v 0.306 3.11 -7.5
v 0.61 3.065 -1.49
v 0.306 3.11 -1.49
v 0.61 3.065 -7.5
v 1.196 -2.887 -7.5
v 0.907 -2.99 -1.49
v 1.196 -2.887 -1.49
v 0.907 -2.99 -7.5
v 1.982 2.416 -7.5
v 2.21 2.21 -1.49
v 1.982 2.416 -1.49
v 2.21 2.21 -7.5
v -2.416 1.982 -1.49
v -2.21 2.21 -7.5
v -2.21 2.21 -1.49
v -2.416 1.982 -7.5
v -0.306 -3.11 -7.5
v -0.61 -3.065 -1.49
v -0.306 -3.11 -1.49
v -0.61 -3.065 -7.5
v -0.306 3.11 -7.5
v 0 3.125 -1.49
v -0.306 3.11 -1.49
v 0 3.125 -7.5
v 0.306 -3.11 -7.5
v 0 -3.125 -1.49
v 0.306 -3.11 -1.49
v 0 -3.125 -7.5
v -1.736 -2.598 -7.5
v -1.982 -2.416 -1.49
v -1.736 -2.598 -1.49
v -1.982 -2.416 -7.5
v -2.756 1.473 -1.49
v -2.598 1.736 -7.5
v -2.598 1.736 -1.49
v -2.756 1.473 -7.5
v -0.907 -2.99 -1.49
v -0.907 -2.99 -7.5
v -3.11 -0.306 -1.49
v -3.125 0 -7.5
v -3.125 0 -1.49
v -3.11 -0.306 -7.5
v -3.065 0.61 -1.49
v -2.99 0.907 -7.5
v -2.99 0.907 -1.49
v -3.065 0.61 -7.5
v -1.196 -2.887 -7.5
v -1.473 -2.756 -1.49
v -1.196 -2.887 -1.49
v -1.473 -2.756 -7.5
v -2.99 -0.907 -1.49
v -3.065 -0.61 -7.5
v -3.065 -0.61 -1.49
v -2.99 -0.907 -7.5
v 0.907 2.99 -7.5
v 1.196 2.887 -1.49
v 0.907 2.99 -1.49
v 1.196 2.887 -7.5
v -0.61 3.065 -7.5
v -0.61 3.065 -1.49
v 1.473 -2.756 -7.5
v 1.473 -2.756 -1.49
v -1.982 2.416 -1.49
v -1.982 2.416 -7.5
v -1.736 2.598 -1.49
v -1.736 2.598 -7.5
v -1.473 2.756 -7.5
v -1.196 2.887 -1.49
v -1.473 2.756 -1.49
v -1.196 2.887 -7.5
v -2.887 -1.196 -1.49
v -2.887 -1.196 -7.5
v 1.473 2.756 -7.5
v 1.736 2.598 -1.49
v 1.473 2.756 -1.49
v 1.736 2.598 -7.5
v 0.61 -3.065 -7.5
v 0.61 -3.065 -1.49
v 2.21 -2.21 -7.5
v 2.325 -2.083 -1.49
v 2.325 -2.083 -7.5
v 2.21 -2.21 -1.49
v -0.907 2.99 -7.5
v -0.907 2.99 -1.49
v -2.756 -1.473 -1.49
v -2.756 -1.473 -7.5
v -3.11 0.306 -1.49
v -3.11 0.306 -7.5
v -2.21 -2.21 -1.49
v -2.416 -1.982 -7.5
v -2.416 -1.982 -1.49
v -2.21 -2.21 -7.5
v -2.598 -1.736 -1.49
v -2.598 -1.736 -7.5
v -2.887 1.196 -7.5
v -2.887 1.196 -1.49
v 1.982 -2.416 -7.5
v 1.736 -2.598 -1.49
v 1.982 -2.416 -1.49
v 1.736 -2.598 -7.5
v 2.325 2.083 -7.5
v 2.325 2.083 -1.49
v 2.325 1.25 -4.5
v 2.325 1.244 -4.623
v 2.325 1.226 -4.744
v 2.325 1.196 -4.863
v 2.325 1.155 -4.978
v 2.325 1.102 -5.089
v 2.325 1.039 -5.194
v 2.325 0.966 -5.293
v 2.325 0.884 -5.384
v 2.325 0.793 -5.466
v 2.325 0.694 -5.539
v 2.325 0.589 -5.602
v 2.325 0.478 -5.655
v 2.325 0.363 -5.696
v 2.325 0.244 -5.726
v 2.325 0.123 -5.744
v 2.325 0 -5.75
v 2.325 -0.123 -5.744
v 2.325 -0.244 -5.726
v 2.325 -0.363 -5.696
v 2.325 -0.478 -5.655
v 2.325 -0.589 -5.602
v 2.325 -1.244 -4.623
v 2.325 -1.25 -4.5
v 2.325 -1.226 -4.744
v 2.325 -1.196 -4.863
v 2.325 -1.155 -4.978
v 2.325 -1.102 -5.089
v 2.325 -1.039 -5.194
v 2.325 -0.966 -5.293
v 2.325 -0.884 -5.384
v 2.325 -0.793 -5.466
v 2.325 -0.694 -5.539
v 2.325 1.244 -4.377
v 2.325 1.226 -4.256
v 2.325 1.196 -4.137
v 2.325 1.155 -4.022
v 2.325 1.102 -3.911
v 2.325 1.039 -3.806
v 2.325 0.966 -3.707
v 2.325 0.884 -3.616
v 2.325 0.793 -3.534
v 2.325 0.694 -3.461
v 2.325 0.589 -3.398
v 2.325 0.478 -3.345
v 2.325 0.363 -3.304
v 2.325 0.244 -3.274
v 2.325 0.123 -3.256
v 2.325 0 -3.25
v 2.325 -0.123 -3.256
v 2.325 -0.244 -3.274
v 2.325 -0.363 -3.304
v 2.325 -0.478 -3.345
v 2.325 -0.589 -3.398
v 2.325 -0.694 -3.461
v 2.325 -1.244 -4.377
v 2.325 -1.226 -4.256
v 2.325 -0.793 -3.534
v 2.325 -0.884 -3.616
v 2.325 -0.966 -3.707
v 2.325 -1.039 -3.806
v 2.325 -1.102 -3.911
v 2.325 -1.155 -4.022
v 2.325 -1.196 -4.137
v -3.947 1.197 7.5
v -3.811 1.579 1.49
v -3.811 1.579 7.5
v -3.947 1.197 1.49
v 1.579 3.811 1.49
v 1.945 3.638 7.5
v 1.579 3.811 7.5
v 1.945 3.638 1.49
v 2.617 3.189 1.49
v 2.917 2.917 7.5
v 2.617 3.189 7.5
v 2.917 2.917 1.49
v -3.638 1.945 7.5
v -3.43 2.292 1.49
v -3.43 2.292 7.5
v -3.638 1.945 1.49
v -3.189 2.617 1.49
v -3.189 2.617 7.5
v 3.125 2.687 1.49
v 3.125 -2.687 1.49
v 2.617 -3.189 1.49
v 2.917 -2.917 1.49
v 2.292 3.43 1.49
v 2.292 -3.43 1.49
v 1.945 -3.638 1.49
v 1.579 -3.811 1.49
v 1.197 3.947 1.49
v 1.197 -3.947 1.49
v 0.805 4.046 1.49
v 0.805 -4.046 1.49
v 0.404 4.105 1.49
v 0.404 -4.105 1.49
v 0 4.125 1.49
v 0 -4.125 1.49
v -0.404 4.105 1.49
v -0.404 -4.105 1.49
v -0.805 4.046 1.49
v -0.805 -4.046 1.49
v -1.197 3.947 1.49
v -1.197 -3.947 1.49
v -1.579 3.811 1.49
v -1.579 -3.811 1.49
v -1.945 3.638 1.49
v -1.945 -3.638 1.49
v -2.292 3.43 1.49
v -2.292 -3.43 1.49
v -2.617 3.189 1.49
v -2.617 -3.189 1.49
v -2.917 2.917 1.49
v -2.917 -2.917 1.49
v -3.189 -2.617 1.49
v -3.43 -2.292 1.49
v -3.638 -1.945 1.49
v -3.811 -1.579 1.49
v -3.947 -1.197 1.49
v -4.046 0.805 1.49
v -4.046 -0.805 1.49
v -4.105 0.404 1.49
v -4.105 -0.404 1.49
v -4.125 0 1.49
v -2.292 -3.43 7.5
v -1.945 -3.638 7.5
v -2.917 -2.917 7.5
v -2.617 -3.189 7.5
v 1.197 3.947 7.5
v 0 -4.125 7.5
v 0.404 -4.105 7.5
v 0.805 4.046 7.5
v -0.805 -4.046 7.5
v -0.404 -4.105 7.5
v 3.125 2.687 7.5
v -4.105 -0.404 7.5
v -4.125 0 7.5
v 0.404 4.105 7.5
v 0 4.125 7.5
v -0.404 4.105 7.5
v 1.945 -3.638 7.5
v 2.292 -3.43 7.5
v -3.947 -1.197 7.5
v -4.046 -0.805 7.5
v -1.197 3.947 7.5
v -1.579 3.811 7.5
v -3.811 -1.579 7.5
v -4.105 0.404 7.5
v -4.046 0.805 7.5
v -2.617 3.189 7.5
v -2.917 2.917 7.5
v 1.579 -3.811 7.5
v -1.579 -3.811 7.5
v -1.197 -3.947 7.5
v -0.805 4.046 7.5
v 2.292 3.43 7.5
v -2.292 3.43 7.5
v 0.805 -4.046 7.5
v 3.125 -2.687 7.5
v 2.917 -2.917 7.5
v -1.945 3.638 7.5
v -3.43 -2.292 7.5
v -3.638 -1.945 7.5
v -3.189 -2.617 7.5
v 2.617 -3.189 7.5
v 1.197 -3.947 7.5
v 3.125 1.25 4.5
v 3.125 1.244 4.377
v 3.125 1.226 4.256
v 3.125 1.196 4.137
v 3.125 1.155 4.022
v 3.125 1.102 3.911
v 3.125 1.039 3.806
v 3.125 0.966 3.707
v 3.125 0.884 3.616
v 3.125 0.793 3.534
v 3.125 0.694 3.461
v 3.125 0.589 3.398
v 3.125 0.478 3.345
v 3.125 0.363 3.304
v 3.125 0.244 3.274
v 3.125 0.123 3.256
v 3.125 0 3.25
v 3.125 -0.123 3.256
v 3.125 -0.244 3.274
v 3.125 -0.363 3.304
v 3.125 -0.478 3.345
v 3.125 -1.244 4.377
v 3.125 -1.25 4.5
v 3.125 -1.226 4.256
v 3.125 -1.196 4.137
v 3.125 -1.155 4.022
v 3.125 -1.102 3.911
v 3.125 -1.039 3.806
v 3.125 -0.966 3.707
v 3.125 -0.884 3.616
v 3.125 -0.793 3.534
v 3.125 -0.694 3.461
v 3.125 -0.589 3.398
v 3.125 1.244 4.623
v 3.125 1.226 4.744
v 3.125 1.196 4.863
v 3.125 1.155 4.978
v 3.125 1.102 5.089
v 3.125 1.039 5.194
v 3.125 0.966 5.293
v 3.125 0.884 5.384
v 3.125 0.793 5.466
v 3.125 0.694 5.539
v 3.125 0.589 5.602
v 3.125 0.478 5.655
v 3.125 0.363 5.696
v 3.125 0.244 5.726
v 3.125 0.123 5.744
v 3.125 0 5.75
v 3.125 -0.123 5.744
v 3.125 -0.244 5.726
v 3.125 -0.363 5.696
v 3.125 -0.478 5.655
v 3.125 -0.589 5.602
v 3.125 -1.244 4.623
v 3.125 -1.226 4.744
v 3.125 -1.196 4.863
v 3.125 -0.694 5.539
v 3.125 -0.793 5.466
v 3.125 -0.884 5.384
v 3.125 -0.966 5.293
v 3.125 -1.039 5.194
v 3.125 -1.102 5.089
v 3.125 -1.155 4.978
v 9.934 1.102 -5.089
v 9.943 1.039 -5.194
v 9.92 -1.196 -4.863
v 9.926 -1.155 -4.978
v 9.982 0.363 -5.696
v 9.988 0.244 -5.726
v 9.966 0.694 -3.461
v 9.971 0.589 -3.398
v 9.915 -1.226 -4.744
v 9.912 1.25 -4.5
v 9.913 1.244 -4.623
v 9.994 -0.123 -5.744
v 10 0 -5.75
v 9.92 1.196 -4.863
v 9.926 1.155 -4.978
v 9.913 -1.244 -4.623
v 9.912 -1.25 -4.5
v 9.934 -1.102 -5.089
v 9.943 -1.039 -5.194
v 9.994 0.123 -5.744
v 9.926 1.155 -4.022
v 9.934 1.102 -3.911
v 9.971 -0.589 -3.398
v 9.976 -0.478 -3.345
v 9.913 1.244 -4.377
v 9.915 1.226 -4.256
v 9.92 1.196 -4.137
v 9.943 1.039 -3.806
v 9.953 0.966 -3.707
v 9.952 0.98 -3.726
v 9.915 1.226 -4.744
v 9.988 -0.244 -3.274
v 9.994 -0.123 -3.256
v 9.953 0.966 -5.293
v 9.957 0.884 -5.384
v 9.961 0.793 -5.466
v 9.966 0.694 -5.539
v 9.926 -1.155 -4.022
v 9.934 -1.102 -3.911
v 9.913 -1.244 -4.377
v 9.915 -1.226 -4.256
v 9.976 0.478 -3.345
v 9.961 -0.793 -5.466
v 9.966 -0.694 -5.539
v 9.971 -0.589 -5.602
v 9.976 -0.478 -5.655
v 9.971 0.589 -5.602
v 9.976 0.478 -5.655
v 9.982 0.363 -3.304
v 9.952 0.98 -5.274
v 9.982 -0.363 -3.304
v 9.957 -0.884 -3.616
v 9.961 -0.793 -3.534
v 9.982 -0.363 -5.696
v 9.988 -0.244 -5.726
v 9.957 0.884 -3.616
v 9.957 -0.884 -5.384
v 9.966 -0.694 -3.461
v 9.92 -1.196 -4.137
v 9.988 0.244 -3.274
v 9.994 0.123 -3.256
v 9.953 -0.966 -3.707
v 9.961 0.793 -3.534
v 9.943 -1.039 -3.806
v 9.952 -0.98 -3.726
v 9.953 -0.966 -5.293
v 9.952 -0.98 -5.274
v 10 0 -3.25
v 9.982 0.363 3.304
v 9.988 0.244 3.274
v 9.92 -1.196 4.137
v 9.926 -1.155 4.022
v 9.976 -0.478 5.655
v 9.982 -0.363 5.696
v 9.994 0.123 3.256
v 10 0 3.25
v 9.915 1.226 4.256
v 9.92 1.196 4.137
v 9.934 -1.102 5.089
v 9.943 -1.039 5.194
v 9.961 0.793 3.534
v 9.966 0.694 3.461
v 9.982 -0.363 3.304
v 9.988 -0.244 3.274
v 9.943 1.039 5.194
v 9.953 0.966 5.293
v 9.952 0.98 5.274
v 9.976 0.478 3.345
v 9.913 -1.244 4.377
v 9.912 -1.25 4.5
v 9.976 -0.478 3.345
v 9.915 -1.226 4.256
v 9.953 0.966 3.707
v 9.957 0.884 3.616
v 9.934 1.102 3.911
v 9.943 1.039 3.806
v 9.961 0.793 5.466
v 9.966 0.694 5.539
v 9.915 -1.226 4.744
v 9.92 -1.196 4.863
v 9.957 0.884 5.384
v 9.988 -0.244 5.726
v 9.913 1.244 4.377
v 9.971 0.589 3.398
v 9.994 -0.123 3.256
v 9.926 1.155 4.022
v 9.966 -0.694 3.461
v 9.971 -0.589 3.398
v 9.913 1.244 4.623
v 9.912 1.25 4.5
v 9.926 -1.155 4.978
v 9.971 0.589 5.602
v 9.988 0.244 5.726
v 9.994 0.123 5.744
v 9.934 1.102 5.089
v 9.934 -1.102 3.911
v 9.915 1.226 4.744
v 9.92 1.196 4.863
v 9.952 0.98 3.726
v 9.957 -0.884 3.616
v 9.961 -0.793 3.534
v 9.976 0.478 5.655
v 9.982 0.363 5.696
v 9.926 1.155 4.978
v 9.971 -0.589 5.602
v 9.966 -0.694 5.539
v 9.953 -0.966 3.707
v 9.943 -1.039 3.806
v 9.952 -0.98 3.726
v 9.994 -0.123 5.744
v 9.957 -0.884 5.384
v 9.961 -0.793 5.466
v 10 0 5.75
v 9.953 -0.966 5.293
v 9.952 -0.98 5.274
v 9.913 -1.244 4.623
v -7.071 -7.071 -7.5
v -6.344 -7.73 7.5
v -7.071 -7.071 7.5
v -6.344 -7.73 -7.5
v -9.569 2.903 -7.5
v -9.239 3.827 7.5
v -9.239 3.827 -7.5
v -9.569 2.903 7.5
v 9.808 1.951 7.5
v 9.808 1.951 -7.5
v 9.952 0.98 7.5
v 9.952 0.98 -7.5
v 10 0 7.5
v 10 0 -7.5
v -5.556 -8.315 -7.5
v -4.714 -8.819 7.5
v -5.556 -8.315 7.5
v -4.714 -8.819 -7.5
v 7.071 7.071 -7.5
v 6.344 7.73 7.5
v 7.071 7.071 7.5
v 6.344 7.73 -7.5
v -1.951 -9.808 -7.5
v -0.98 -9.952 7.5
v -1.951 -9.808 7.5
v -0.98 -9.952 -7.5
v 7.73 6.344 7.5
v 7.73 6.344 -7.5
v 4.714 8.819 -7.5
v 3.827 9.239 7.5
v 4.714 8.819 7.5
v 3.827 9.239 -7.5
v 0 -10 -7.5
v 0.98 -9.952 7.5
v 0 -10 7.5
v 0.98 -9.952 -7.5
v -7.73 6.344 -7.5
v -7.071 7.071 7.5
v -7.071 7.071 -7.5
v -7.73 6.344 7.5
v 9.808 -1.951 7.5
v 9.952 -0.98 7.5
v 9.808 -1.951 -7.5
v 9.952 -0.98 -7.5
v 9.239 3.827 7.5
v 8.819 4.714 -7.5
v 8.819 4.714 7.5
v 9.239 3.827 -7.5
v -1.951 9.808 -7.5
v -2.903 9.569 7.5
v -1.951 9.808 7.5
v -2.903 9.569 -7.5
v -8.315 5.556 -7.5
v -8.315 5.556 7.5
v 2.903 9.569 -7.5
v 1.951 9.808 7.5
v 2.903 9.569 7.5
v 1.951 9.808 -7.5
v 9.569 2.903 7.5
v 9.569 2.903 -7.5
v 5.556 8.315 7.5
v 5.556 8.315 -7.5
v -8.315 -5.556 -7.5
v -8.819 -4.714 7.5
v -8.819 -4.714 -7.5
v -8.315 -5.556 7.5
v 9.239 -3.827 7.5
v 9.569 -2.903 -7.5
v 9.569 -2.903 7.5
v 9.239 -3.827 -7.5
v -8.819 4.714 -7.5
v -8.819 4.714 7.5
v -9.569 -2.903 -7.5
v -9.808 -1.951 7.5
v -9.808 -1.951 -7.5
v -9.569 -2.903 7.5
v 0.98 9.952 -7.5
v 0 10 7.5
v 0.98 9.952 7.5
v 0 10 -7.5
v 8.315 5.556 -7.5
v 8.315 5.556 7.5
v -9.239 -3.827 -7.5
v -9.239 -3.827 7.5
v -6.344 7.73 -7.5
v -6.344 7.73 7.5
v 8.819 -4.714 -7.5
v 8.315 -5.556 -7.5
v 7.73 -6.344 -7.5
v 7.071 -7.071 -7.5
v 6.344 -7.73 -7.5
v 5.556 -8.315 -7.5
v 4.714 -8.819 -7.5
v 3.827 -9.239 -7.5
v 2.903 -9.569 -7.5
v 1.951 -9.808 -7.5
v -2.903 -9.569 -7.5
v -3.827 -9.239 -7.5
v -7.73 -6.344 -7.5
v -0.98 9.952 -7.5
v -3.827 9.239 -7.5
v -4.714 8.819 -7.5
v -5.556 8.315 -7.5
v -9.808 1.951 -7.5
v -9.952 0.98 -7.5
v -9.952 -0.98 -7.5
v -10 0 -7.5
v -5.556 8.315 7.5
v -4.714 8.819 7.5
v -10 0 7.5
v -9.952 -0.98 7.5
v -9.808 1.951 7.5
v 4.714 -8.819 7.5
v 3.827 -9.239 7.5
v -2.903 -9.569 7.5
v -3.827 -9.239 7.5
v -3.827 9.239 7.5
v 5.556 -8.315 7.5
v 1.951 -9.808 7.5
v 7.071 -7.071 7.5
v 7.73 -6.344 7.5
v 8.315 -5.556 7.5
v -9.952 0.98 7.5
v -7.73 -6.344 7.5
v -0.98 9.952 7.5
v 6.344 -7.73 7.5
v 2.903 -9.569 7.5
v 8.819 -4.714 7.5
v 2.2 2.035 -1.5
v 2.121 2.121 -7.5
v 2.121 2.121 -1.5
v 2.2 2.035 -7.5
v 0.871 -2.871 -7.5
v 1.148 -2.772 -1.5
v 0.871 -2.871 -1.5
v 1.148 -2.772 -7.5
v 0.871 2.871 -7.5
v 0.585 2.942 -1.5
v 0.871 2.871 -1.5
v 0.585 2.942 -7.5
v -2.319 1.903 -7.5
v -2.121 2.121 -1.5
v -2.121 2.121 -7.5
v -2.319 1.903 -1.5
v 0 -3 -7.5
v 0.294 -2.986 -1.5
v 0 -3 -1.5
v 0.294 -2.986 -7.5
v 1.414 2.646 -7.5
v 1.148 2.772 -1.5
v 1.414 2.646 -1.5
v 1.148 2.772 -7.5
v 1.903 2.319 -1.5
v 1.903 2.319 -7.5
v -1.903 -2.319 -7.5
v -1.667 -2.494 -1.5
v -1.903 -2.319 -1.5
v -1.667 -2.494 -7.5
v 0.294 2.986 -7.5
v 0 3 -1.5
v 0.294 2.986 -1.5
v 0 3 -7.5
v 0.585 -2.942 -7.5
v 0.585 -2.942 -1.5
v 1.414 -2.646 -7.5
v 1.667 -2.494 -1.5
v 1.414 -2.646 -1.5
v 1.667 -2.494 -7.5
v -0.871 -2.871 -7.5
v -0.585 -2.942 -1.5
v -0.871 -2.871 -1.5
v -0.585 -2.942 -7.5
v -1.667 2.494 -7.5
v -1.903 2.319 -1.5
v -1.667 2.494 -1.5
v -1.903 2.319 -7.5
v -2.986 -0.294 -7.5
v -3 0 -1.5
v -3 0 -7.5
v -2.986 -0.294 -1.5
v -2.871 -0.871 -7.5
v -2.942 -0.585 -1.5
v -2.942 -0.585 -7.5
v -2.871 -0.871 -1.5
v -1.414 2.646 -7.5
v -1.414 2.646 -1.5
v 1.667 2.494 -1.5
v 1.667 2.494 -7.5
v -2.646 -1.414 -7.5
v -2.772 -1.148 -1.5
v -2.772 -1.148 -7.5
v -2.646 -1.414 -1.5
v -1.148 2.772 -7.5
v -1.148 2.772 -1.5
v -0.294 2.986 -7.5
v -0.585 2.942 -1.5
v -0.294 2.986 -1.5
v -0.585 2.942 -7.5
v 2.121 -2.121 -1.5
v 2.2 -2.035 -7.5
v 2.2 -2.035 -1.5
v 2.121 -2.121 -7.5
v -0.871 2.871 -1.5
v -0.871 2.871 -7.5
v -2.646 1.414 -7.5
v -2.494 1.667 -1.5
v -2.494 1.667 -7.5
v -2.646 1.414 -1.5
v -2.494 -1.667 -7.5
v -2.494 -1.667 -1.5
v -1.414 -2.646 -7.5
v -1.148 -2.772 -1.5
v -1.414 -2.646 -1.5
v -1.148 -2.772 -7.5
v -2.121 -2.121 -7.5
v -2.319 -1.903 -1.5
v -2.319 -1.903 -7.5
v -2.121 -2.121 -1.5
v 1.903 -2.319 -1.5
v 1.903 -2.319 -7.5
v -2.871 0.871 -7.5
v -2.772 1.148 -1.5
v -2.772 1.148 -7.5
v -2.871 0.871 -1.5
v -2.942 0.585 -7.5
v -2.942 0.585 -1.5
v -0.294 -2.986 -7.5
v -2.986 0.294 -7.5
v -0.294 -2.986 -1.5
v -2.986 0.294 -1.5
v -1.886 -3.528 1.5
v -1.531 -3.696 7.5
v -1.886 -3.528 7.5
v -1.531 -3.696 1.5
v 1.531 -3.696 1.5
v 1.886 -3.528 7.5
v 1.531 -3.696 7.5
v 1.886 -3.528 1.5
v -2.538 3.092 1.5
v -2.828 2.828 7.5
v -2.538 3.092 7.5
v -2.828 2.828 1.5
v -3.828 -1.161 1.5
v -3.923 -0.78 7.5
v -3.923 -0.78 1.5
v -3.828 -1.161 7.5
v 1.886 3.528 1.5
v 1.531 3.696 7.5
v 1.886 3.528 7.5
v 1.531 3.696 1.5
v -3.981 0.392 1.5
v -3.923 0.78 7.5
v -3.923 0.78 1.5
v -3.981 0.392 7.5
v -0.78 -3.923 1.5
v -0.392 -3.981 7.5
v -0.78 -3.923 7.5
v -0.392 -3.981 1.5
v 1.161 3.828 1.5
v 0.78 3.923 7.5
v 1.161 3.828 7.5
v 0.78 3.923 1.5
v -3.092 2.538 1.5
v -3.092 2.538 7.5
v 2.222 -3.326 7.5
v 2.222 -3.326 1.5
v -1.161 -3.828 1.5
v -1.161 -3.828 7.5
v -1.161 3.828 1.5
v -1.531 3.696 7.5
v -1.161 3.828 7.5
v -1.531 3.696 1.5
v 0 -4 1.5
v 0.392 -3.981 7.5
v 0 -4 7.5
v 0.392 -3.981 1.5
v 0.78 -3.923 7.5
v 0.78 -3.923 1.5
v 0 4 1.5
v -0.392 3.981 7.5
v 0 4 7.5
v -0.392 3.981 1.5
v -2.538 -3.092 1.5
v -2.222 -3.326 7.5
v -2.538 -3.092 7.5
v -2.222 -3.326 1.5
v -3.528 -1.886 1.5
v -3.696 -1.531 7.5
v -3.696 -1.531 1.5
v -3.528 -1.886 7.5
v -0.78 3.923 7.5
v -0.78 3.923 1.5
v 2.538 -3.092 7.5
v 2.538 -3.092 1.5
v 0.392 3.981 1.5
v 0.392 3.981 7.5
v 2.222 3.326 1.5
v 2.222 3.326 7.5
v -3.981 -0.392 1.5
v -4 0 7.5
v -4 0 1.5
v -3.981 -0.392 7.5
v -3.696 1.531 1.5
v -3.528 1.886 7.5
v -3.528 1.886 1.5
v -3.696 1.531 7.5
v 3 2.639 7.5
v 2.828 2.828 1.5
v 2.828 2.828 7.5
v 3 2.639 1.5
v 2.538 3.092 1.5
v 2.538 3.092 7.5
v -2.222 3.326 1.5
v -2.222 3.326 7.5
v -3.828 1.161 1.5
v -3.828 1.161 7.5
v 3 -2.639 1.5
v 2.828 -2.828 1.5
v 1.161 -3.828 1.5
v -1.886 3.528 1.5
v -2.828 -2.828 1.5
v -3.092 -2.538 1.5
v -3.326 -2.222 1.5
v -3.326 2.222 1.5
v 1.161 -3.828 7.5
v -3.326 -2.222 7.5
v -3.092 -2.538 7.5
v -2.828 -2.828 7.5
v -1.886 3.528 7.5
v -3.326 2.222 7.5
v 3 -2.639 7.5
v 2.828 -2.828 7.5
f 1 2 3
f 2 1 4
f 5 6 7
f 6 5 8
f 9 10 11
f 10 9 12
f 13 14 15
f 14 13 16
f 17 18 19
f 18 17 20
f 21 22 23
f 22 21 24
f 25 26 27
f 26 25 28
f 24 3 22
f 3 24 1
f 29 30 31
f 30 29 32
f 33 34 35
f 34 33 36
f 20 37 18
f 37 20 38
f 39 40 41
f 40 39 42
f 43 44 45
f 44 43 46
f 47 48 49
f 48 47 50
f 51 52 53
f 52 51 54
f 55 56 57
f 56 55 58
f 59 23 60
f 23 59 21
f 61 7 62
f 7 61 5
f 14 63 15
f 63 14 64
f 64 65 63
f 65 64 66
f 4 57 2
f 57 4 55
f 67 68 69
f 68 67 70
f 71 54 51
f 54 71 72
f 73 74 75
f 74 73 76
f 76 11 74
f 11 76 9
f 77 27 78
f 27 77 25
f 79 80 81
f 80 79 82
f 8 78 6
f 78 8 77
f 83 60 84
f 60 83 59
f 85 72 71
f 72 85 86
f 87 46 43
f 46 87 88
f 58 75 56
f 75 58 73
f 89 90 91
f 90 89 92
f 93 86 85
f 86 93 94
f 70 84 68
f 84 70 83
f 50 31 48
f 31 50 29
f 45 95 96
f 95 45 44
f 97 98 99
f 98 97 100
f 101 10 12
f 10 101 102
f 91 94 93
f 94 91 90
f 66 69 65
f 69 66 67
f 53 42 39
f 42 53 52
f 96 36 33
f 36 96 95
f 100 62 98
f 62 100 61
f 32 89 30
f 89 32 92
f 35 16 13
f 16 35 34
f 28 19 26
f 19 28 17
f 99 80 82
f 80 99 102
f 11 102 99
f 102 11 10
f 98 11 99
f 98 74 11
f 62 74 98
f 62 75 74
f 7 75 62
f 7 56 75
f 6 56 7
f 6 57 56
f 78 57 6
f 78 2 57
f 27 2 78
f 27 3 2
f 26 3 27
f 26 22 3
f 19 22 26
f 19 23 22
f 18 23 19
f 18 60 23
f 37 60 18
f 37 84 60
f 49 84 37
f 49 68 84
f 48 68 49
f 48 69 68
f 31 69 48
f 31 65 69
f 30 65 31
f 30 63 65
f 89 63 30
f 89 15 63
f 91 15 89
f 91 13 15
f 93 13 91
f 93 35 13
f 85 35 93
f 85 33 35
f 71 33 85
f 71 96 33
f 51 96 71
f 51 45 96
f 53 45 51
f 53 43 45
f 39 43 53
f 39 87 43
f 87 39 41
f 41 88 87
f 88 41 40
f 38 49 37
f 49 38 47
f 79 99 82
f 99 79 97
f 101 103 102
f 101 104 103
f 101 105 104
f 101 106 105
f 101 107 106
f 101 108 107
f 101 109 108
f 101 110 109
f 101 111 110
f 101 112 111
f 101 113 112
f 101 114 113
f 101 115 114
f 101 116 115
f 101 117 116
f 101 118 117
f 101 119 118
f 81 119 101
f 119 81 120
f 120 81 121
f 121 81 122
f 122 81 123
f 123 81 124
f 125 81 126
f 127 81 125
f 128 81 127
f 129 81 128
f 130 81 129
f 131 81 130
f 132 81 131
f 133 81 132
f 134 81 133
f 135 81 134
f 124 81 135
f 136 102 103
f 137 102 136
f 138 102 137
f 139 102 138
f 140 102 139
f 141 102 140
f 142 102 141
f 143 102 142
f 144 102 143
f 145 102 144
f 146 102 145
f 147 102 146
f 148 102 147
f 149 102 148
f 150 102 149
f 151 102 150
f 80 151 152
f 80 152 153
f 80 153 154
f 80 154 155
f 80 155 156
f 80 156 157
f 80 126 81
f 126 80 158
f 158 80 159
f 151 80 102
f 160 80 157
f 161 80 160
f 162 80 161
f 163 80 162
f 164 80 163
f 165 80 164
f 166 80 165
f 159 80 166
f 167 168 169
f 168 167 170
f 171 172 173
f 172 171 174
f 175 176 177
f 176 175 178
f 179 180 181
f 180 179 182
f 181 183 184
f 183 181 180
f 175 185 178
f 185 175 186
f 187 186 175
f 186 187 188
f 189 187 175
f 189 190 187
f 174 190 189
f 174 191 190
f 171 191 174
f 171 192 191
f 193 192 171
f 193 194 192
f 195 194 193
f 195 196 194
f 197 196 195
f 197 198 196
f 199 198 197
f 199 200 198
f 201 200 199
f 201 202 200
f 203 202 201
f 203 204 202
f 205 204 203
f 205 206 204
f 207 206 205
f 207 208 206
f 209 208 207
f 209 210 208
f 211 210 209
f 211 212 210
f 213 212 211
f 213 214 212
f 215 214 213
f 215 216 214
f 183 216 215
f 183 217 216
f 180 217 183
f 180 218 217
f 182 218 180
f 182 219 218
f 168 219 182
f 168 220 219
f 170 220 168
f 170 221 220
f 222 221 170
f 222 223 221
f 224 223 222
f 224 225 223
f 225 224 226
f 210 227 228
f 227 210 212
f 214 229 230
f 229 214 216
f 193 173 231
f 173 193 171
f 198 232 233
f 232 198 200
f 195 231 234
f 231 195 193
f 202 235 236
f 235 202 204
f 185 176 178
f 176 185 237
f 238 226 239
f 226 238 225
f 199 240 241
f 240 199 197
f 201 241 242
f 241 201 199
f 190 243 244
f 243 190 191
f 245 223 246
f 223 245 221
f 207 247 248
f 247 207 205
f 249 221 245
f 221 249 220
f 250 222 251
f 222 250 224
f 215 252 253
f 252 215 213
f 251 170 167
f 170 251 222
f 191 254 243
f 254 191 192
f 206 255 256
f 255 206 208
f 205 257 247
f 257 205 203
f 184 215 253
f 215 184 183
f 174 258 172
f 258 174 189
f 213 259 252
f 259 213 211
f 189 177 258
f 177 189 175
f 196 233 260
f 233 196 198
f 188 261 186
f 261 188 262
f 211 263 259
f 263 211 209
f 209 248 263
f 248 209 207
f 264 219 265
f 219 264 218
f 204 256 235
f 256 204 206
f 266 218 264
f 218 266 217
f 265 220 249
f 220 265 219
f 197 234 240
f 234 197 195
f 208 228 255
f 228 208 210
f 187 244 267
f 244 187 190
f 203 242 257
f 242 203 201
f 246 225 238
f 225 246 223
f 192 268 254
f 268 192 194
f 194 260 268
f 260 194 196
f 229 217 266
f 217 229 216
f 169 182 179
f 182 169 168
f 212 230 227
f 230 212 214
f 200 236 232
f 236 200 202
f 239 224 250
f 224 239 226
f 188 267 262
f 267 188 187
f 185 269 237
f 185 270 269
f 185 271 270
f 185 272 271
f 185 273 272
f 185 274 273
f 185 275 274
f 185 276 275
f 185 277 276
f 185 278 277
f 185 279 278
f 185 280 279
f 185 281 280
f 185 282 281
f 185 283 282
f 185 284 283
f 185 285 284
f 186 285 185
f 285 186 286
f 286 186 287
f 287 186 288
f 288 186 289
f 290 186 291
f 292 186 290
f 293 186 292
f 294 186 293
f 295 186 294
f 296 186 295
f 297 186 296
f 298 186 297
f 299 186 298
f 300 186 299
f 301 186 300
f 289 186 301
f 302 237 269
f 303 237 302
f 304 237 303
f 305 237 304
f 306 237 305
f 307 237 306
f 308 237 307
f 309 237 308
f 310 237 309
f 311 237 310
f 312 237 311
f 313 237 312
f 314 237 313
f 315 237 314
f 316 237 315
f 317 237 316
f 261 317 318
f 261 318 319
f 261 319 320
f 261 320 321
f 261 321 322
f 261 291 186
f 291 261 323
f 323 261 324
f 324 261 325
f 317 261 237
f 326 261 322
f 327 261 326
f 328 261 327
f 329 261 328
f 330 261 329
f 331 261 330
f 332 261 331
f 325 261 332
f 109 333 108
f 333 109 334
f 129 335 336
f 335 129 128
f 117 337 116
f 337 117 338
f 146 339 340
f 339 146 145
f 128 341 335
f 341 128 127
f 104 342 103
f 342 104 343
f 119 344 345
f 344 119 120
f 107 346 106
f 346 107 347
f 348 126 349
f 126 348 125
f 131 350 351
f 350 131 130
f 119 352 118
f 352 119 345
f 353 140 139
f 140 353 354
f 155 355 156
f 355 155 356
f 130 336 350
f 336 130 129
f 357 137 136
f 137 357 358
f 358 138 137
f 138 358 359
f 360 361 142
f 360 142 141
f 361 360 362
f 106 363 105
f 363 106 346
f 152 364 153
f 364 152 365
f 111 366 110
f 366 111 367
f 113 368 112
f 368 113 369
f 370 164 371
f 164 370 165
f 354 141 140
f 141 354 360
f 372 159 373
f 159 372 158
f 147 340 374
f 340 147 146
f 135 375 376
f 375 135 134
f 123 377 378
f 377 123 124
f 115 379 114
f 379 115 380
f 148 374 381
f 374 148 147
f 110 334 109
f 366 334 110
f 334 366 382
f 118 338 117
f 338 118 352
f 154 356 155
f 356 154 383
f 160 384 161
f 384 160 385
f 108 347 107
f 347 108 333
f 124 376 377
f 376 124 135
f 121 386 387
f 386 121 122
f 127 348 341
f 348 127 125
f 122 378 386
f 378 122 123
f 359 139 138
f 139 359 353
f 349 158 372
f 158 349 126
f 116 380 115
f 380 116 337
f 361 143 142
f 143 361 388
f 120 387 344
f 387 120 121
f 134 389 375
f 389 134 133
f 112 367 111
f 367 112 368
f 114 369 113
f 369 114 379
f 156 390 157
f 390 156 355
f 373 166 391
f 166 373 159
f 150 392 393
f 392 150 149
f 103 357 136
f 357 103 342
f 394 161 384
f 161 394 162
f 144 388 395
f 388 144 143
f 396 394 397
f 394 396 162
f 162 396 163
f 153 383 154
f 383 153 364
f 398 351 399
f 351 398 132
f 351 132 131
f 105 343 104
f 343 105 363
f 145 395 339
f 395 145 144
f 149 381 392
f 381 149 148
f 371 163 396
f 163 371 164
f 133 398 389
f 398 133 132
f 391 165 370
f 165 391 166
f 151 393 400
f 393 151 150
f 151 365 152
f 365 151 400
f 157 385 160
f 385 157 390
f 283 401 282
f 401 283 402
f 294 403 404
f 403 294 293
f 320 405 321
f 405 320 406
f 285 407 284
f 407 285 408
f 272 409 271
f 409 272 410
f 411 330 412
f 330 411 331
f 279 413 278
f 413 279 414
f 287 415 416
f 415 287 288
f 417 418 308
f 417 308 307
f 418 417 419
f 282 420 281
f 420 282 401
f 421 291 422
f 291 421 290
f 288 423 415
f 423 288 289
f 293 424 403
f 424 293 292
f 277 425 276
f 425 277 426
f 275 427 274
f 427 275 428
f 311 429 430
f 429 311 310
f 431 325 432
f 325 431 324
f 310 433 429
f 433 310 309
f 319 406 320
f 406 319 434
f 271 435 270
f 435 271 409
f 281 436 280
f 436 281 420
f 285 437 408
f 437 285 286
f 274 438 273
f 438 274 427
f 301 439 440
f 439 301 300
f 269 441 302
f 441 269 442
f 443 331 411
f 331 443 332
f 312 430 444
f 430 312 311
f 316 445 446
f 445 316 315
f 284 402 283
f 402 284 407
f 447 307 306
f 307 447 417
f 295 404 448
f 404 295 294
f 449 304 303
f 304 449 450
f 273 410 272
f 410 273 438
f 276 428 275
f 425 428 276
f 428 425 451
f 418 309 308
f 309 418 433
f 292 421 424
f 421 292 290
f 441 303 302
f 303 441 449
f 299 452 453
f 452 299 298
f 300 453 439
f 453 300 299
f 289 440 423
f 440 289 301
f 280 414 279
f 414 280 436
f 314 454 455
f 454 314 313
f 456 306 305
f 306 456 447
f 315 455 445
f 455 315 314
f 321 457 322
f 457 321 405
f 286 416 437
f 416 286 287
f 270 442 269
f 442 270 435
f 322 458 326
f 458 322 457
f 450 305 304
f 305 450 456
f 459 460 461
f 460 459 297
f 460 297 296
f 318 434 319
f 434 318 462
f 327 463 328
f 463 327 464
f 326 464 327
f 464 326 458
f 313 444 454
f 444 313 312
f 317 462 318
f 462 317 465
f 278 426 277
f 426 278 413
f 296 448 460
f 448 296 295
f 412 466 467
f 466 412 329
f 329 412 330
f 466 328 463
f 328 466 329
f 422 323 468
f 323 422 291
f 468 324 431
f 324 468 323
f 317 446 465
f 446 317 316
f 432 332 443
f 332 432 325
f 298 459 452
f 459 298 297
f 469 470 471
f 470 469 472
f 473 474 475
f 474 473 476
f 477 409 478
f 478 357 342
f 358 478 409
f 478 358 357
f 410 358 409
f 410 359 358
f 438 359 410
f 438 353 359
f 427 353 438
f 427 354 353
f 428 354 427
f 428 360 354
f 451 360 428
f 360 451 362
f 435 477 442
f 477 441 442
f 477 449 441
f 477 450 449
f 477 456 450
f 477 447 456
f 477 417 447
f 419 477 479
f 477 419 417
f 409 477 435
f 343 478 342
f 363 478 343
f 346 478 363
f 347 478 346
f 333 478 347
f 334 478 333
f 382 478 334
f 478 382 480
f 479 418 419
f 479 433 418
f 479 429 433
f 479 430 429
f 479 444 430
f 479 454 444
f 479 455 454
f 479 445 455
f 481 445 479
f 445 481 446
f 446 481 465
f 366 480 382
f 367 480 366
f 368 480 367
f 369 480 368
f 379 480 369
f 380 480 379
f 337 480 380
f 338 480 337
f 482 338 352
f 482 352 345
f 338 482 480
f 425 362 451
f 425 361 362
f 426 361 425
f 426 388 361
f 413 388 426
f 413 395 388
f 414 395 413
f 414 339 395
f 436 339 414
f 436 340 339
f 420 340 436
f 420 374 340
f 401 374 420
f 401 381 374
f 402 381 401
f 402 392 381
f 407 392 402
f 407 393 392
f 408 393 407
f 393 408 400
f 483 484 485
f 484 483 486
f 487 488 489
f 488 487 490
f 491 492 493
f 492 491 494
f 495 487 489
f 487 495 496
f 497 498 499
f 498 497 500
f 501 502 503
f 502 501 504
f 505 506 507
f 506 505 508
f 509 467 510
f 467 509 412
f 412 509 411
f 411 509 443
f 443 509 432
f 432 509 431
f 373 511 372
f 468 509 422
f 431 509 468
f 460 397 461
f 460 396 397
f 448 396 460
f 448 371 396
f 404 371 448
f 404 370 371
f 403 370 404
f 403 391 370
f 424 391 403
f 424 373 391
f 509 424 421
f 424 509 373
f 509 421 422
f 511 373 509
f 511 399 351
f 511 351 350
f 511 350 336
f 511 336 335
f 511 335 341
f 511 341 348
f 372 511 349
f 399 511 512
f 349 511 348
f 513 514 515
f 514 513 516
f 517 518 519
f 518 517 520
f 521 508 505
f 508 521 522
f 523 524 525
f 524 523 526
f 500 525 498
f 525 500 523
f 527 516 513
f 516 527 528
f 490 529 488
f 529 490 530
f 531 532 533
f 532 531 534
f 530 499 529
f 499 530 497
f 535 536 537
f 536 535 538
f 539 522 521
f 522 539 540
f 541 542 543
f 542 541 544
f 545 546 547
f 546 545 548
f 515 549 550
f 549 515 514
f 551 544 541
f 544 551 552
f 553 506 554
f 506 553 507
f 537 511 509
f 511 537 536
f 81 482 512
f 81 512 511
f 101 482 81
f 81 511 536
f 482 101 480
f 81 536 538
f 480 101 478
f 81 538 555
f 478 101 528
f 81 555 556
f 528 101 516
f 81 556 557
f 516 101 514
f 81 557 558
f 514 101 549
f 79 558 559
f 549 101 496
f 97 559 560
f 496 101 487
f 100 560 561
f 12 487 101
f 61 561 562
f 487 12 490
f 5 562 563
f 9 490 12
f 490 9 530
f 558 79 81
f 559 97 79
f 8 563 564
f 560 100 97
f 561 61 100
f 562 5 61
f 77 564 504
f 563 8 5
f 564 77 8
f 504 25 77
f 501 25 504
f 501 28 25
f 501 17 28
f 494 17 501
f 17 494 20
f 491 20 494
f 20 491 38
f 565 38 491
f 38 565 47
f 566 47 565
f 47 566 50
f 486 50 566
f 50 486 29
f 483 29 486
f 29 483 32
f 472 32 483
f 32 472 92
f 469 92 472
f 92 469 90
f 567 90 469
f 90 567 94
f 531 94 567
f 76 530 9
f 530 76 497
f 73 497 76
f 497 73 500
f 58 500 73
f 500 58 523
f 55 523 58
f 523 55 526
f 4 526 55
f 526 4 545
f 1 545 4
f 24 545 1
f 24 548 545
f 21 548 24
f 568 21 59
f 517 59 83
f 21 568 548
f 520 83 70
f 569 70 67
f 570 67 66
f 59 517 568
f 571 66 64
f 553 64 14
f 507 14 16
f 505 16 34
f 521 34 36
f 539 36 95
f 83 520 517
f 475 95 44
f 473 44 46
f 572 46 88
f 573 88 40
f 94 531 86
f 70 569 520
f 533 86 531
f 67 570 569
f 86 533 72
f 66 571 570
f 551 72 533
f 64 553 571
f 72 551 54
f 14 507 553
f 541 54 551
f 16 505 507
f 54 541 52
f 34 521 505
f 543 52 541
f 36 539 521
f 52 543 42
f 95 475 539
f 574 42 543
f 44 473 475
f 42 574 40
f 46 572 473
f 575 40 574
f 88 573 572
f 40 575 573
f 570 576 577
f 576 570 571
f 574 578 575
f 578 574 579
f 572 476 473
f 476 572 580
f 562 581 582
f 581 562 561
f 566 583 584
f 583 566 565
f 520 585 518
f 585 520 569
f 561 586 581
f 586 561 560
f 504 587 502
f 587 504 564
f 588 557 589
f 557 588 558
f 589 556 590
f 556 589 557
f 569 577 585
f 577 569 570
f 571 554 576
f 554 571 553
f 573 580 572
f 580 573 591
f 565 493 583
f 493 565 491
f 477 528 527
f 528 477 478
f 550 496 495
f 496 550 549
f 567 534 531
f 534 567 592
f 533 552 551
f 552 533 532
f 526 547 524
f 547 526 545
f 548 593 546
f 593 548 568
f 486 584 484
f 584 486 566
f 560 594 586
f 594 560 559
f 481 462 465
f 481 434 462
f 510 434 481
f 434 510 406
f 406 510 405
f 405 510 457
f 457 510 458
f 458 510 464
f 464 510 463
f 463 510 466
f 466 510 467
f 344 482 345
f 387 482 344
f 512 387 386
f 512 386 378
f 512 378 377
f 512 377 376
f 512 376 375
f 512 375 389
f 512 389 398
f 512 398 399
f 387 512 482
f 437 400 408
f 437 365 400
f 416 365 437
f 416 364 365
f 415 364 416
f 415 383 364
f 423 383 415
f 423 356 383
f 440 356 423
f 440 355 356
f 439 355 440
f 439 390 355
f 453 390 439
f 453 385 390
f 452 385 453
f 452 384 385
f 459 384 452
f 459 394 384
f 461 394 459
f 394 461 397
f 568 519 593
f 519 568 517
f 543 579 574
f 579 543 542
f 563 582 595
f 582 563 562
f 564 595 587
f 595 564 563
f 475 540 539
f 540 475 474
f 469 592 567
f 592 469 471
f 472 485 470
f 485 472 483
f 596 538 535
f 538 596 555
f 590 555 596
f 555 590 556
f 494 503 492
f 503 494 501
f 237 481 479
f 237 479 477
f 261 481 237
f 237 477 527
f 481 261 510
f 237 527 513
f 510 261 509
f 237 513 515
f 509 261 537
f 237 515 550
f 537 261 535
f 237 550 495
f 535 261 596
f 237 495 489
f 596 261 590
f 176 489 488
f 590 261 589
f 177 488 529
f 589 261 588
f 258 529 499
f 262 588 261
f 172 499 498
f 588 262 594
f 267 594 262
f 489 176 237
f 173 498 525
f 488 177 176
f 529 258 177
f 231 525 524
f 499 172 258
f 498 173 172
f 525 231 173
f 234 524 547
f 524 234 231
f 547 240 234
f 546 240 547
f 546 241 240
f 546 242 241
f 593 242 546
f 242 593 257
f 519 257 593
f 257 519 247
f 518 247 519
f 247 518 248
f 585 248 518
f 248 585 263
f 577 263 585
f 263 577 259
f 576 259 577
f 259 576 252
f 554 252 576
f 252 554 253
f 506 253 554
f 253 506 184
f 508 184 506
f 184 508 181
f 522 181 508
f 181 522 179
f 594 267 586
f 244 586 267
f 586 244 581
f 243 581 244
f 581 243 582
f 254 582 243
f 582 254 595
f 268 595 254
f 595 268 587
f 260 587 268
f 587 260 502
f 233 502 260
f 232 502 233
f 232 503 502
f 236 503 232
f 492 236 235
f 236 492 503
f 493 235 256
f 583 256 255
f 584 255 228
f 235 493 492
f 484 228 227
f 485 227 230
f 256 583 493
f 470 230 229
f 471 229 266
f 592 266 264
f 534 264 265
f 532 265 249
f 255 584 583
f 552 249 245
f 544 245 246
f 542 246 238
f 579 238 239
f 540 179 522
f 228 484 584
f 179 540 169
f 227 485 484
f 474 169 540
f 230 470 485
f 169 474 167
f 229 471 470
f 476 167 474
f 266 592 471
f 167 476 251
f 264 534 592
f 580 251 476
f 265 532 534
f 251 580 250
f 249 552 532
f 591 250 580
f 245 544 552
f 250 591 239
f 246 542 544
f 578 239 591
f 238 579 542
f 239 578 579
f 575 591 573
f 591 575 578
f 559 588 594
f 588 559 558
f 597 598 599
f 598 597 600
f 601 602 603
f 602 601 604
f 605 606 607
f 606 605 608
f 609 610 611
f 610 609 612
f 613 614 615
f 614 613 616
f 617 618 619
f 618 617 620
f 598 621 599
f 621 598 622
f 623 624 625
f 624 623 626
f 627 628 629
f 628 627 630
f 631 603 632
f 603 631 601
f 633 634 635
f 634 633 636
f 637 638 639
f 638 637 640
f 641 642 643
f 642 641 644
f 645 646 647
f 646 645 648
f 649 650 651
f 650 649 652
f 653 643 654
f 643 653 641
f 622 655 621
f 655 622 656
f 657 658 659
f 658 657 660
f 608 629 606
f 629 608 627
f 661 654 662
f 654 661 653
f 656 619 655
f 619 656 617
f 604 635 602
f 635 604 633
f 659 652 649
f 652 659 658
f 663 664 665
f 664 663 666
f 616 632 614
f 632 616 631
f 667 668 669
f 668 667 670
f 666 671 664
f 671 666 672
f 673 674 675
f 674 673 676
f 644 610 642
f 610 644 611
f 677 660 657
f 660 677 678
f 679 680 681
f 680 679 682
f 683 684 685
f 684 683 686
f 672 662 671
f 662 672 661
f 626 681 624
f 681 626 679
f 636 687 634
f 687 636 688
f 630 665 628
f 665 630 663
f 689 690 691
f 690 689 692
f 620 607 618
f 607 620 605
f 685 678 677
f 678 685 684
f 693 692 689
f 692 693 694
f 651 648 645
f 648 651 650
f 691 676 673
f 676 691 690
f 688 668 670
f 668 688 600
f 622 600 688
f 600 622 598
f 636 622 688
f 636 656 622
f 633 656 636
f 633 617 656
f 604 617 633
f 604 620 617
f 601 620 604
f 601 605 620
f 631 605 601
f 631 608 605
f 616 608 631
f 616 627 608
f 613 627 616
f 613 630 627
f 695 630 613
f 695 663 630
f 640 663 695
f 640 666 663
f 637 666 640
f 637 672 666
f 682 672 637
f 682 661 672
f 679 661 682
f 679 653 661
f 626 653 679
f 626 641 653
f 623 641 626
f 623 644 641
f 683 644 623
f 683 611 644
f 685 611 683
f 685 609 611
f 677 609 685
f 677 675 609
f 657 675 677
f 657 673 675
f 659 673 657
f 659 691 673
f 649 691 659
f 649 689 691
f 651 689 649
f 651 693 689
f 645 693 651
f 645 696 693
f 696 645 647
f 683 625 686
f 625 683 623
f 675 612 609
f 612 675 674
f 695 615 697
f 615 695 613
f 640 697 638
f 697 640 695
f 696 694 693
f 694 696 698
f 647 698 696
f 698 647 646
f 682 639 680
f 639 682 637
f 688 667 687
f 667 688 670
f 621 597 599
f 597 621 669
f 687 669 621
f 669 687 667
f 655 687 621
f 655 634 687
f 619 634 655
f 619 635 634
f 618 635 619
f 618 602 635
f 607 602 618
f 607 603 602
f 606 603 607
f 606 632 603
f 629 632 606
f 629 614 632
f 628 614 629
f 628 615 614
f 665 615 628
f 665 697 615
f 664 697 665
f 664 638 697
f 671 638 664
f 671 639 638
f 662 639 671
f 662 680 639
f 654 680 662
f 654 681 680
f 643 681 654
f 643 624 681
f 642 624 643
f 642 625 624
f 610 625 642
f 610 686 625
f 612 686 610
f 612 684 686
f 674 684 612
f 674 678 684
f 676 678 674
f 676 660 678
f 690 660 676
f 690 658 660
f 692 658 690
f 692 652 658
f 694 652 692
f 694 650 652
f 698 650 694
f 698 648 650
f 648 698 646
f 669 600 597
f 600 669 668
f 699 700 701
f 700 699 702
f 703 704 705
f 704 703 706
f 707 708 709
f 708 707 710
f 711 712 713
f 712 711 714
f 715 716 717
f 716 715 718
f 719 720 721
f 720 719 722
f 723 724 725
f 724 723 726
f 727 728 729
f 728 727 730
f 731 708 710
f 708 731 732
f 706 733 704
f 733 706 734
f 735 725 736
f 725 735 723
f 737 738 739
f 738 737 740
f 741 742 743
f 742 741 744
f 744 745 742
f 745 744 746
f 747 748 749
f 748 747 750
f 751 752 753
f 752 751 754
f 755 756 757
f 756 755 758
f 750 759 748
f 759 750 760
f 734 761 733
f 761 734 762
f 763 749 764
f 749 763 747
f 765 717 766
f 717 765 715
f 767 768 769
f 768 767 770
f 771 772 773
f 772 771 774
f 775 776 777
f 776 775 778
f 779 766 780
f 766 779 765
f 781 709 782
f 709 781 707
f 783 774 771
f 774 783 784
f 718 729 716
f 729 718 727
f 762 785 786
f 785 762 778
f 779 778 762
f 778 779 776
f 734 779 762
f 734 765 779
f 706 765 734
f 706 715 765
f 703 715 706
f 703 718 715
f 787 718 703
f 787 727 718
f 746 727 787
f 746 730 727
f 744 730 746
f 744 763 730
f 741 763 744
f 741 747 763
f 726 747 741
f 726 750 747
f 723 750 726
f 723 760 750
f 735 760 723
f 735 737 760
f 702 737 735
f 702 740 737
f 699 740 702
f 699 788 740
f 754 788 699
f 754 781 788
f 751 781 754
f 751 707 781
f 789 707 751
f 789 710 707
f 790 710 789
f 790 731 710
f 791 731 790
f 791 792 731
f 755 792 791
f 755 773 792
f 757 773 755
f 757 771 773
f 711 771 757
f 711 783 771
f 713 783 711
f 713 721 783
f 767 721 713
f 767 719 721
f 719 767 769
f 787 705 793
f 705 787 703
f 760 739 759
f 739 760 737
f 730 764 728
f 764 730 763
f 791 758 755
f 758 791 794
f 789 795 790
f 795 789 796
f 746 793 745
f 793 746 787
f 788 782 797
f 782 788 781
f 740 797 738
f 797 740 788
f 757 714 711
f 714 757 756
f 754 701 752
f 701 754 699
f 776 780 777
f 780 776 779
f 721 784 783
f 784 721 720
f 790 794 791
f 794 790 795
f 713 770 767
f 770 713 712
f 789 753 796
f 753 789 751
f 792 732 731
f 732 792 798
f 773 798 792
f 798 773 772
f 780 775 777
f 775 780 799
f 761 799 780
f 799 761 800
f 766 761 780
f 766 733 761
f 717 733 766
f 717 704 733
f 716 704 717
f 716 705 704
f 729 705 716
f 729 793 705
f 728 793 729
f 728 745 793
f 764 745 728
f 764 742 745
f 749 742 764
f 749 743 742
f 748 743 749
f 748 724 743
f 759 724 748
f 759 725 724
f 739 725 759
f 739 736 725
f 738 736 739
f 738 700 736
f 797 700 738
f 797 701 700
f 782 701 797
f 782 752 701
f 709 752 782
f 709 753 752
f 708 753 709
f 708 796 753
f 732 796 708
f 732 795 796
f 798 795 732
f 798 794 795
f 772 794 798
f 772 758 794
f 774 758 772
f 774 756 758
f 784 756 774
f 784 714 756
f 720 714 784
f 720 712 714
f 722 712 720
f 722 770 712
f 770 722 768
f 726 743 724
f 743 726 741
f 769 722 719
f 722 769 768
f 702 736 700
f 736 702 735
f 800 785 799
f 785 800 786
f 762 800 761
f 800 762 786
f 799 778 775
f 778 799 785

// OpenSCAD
/*
  Standalone two-sided actuator coupler interface study.
  Units: millimetres. Packaging/interface proxy only; no fabrication dimensions.

  The Blue Trail SER-203X/SER-213X product pages describe a 6 mm titanium
  D-profile output shaft. The pivot side here is an 8 mm D-bore matching the
  current gripper study's shaft-flat convention. The exact vendor flat depth,
  chamfer, shaft projection, allowable radial/axial load, hub fit, and retention
  geometry are not established by this proxy. Replace them from the vendor's
  November 2026 STEP archive and current interface drawing before integration.

  The two shaft sockets are blind bores with a central web. Stub shafts are
  visual fit proxies only. Radial retention holes are unthreaded pilot proxies;
  they do not define a safe set screw, clamp hub, or torque rating.
*/

$fn = 64;

// Choose "D" for the current Blue Trail shaft-interface concept, or "round"
// for a round shaft. Neither profile is a vendor-qualified fit.
motor_shaft_profile = "D"; // [D,round]

// Motor-side interface (SER-203X/SER-213X family reference only).
motor_shaft_d = 6.0;
motor_shaft_flat_depth = 0.8;       // UNKNOWN; replace from vendor STEP/drawing
motor_shaft_diametral_clearance = 0.25; // UNKNOWN; fit/tolerance placeholder
motor_shaft_engagement = 6.0;       // UNKNOWN; available shaft length not checked

// Pivot-side interface follows the current study's nominal 8 mm D shaft.
pivot_shaft_d = 8.0;
pivot_shaft_flat_depth = 1.0;       // study convention: 4 mm radius to x=3 mm flat
pivot_shaft_diametral_clearance = 0.25; // UNKNOWN; fit/tolerance placeholder
pivot_shaft_engagement = 6.0;       // UNKNOWN; retention stack not checked

// Body/web dimensions are visual packaging assumptions, not selected hardware.
coupler_outer_d = 20.0;
central_web_t = 3.0;                // UNKNOWN; size for torque, fatigue and set screws
motor_retention_type = "TBD";       // [TBD,set_screw_proxy,clamp_hub,vendor_hub]
pivot_retention_type = "TBD";       // [TBD,set_screw_proxy,clamp_hub,integral_D_hub]
show_shaft_stubs = true;
show_retention_pilot_holes = true;
motor_retention_pilot_d = 2.5;      // schematic pilot only, not a thread specification
pivot_retention_pilot_d = 2.5;      // schematic pilot only, not a thread specification
retention_pilot_depth = 8.5;        // UNKNOWN; radial access/pilot depth placeholder
part_view = "assembly";             // [assembly,coupler_only,motor_bore,pivot_bore]

assert(motor_shaft_profile == "D" || motor_shaft_profile == "round",
       "motor_shaft_profile must be D or round");
assert(motor_shaft_d > 0 && pivot_shaft_d > 0 && coupler_outer_d > 0,
       "shaft and coupler diameters must be positive");
assert(motor_shaft_engagement > 0 && pivot_shaft_engagement > 0 && central_web_t > 0,
       "engagements and central web must be positive");
assert(coupler_outer_d > max(motor_shaft_d, pivot_shaft_d),
       "coupler outer diameter must exceed both shaft diameters");
assert(coupler_outer_d - max(motor_shaft_d, pivot_shaft_d) >= 2,
       "at least 1 mm nominal radial wall is required for this packaging proxy");

coupler_length = motor_shaft_engagement + central_web_t + pivot_shaft_engagement;
motor_bore_center_z = -coupler_length/2 + motor_shaft_engagement/2;
pivot_bore_center_z = coupler_length/2 - pivot_shaft_engagement/2;

function bore_flat_x(shaft_d, flat_depth, diametral_clearance) =
    shaft_d/2 - flat_depth + diametral_clearance/2;

module d_bore(shaft_d, flat_depth, diametral_clearance, depth) {
    bore_d = shaft_d + diametral_clearance;
    flat_x = bore_flat_x(shaft_d, flat_depth, diametral_clearance);
    assert(flat_depth > 0 && flat_depth < shaft_d/2,
           "D-flat depth must be between zero and the shaft radius");
    difference() {
        cylinder(d=bore_d, h=depth, center=true);
        // Remove the circle segment beyond the flat. Clearance shifts the
        // bore flat outward by half the diametral allowance.
        translate([flat_x + bore_d, 0, 0])
            cube([2*bore_d, 2*bore_d, depth+0.2], center=true);
    }
}

module motor_bore(depth) {
    if (motor_shaft_profile == "D")
        d_bore(motor_shaft_d, motor_shaft_flat_depth,
               motor_shaft_diametral_clearance, depth);
    else
        cylinder(d=motor_shaft_d+motor_shaft_diametral_clearance,
                 h=depth, center=true);
}

module pivot_bore(depth) {
    d_bore(pivot_shaft_d, pivot_shaft_flat_depth,
           pivot_shaft_diametral_clearance, depth);
}

module shaft_stubs() {
    if (show_shaft_stubs) {
        color([0.25,0.44,0.69])
            translate([0,0,motor_bore_center_z])
                if (motor_shaft_profile == "D")
                    d_bore(motor_shaft_d, motor_shaft_flat_depth, 0,
                           motor_shaft_engagement);
                else
                    cylinder(d=motor_shaft_d,h=motor_shaft_engagement,
                             center=true);
        color([0.55,0.58,0.62])
            translate([0,0,pivot_bore_center_z])
                d_bore(pivot_shaft_d,pivot_shaft_flat_depth,0,
                       pivot_shaft_engagement);
    }
}

module retention_pilot_holes() {
    if (show_retention_pilot_holes) {
        for (z=[motor_bore_center_z,pivot_bore_center_z])
            translate([coupler_outer_d/2-retention_pilot_depth/2+0.05,
                       0,z])
                rotate([0,90,0])
                    cylinder(d=(z == motor_bore_center_z
                                ? motor_retention_pilot_d
                                : pivot_retention_pilot_d),
                             h=retention_pilot_depth+0.1,center=true);
    }
}

module coupler_body() {
    color([0.82,0.68,0.36])
        difference() {
            cylinder(d=coupler_outer_d,h=coupler_length,center=true);
            translate([0,0,motor_bore_center_z])
                motor_bore(motor_shaft_engagement+0.02);
            translate([0,0,pivot_bore_center_z])
                pivot_bore(pivot_shaft_engagement+0.02);
            retention_pilot_holes();
        }
}

module actuator_dshaft_coupler_module() {
    coupler_body();
    shaft_stubs();
    echo(str("Two-sided coupler proxy: OD ",coupler_outer_d,
             " mm; total length ",coupler_length," mm; central web ",
             central_web_t," mm."));
    echo(str("Motor bore profile = ",motor_shaft_profile,
             "; motor retention = ",motor_retention_type,
             "; pivot retention = ",pivot_retention_type,"."));
    echo("UNQUALIFIED INTERFACE PROXY: shaft flats, fit, engagement, hub retention, materials and torque capacity remain TBD; replace against vendor STEP and selected hardware.");
}

if (part_view == "assembly") actuator_dshaft_coupler_module();
else if (part_view == "coupler_only") coupler_body();
else if (part_view == "motor_bore") motor_bore(motor_shaft_engagement+0.02);
else if (part_view == "pivot_bore") pivot_bore(pivot_shaft_engagement+0.02);
